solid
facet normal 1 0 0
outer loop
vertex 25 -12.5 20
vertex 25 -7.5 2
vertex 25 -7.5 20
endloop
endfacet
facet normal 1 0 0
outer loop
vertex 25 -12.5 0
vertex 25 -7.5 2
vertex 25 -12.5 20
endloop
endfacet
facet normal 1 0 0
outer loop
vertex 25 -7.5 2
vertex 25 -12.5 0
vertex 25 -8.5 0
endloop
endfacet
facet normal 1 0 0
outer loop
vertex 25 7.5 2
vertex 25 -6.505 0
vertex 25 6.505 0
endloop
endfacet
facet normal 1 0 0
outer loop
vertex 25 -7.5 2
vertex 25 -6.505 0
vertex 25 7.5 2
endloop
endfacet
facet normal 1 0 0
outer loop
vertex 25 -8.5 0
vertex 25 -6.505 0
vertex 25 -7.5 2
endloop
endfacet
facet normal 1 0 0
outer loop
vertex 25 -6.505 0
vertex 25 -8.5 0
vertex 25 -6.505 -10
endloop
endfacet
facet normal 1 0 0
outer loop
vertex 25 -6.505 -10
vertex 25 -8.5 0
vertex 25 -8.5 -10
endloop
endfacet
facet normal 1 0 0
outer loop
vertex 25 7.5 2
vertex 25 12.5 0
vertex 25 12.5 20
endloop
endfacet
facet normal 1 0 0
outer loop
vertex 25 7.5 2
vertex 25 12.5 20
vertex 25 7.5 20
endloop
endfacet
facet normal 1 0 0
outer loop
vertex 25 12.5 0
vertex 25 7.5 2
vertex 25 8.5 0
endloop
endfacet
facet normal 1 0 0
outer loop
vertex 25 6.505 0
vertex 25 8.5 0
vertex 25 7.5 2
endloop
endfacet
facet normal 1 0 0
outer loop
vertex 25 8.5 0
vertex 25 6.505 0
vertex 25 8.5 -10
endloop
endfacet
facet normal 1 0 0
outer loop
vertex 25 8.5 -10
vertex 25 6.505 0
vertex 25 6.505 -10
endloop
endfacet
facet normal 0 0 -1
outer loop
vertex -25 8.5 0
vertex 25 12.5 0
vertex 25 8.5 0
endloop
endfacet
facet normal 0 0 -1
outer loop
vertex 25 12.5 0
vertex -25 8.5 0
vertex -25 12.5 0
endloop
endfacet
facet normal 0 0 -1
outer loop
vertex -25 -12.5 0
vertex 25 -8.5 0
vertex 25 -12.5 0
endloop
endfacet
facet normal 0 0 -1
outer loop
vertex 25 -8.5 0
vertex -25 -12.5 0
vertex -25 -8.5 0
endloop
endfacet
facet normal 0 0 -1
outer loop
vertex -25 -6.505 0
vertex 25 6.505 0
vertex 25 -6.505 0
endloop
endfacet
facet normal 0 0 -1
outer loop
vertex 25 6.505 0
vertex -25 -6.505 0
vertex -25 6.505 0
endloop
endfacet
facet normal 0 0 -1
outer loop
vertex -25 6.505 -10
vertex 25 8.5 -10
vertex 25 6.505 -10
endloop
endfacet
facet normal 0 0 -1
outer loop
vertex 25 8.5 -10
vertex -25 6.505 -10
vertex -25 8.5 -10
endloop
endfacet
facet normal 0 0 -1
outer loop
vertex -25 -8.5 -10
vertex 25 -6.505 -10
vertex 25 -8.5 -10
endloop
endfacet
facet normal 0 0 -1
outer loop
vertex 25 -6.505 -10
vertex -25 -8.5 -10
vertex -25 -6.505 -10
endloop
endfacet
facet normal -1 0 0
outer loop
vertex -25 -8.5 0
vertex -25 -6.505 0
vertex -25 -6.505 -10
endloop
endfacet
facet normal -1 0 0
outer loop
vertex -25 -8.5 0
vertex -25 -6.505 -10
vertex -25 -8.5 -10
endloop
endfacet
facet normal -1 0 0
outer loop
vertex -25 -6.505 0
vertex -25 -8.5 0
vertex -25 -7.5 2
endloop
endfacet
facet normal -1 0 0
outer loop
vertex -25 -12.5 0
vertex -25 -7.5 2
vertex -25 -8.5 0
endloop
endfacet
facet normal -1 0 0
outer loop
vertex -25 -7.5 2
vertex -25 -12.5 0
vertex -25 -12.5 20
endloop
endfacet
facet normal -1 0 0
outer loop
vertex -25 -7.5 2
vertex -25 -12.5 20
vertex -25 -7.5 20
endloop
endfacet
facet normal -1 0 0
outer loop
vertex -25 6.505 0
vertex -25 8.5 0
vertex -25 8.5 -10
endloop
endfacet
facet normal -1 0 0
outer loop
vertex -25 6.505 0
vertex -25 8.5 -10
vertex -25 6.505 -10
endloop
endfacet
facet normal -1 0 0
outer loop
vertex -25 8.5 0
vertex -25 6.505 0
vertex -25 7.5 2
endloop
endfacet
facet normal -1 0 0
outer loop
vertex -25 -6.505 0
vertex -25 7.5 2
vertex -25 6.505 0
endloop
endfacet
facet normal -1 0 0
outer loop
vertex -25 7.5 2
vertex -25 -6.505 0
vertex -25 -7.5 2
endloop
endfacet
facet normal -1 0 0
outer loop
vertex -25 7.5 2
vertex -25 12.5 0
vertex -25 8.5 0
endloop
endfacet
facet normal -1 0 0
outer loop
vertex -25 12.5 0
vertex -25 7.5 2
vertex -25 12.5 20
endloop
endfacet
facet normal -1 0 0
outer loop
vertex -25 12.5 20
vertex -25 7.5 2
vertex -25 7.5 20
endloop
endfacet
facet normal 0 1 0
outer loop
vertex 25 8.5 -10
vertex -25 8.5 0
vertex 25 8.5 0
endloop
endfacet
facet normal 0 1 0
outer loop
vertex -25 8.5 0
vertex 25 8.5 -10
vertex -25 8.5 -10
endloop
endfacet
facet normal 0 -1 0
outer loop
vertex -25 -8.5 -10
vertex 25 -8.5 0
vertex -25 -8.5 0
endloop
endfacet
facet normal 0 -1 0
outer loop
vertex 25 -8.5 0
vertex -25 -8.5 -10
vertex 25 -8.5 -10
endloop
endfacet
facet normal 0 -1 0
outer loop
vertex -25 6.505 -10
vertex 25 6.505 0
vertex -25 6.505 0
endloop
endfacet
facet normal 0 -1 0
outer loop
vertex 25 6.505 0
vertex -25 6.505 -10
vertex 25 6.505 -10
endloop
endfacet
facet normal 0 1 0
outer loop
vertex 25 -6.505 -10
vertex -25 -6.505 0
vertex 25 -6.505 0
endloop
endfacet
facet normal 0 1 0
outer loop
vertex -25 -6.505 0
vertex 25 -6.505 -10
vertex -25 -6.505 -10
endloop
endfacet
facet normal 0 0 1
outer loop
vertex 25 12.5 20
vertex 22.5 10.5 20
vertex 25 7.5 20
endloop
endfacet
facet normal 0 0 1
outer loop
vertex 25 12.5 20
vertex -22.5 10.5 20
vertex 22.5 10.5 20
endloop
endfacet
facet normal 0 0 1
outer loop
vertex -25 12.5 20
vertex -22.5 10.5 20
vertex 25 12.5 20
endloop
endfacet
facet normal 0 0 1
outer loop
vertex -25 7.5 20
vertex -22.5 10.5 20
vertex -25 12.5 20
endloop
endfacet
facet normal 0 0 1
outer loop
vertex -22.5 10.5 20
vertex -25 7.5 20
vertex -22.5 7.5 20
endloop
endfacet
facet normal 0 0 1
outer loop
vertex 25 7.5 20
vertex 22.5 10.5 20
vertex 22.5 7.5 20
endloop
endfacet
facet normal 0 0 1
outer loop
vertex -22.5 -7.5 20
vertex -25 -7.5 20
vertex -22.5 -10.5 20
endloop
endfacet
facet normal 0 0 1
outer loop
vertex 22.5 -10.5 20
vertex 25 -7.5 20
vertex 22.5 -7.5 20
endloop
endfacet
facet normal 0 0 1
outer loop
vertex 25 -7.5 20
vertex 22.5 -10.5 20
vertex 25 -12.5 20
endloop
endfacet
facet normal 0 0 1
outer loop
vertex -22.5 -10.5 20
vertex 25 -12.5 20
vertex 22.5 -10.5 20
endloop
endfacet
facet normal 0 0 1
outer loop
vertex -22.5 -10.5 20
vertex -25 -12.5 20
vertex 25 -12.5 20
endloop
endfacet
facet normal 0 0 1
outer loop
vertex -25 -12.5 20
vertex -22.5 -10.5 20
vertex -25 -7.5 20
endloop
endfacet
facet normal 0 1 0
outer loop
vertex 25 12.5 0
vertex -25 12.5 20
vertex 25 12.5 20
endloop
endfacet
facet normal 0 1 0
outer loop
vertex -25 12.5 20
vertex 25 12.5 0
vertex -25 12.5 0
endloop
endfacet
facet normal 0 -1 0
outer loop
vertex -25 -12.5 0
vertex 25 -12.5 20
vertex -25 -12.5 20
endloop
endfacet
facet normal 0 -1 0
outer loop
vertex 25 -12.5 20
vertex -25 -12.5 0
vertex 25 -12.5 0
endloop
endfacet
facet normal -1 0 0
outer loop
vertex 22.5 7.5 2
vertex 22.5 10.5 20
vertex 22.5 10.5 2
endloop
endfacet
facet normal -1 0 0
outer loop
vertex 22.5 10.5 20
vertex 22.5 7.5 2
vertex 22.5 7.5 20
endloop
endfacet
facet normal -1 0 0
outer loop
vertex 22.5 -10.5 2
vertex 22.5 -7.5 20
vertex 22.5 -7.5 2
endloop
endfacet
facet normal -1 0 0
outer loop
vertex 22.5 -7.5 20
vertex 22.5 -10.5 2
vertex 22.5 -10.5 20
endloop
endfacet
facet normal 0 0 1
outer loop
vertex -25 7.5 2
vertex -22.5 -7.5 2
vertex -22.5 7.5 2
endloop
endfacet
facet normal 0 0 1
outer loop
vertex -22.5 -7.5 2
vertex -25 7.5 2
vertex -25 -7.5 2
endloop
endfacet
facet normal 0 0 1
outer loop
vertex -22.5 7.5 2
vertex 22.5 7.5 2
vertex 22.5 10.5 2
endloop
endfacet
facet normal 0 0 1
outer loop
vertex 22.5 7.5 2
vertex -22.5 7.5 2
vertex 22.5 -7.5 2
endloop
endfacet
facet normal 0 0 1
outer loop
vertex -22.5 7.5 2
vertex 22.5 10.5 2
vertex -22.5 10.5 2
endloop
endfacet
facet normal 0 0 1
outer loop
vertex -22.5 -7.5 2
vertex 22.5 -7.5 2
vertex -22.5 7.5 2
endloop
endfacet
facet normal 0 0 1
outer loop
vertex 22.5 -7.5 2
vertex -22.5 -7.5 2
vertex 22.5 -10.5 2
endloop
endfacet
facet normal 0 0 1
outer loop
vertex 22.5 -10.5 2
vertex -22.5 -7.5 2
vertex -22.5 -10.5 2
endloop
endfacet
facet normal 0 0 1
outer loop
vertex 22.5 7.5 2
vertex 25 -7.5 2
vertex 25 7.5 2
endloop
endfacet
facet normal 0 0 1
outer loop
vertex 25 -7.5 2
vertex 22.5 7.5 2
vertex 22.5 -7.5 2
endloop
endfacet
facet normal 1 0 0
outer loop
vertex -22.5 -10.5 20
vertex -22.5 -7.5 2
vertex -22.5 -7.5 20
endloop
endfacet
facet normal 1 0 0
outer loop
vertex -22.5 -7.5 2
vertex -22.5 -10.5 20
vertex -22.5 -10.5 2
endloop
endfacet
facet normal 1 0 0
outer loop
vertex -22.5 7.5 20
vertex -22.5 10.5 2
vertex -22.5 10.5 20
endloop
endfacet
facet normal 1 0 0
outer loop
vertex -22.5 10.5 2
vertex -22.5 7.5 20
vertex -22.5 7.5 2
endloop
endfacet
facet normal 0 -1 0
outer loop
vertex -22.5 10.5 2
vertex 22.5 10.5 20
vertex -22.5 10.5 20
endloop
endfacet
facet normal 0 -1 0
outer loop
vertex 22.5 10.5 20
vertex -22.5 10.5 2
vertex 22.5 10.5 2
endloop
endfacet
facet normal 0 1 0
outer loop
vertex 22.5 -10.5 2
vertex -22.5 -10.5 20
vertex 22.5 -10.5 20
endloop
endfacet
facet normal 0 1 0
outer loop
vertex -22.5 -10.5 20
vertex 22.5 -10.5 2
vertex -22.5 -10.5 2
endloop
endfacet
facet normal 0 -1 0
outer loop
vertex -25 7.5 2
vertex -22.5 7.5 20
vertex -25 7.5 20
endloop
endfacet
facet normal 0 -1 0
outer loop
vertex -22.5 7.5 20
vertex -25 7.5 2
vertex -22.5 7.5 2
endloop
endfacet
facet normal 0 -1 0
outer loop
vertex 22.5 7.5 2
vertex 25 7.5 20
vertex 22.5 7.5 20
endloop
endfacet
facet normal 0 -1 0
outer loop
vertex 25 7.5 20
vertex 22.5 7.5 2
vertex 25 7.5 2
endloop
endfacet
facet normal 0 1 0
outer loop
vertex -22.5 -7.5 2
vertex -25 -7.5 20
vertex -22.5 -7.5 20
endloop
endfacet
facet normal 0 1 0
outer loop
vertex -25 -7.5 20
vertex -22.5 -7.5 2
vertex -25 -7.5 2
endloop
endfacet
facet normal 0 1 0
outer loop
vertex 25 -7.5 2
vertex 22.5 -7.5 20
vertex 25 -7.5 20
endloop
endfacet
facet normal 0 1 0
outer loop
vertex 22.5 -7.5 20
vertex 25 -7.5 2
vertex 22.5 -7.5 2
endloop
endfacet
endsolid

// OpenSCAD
holerad=2.5;
module pi(){
difference(){
translate([0,0,-5])cube([90,13+4,10],center=true);
translate([0,0,-5])cube([90.01,13.01,10],center=true);
}
difference(){
    translate([0,0,1])cube([90,60,2],center=true);
    translate([20-60,-24.5, 1])cylinder(4, r=holerad,center=true,$fn=50);
    translate([20-60, 24.5, 1])cylinder(4, r=holerad,center=true,$fn=50);
    translate([20-2,-24.5,  1])cylinder(4, r=holerad,center=true,$fn=50);
    translate([20-2, 24.5,  1])cylinder(4, r=holerad,center=true,$fn=50);
}
}


module speaker(){
    
    difference(){
    translate([0,0,-5])cube([50,13+4,10],center=true);
    translate([0,0,-5])cube([50.01,13.01,10],center=true);
    }

    difference(){
        translate([0,0,10])cube([50,25,20],center=true);
        translate([0,0,10+2])cube([45,21,20],center=true);
        translate([0,0,10+2])cube([55,15,20],center=true);
    }
}



module landing(){
    difference(){
        translate([0,0,5])cube([100,70,10],center=true);
        translate([0,0,6])cube([96,66,8],center=true);
    }
    difference(){
    translate([0,0,-5])cube([100,13+4,10],center=true);
    translate([0,0,-5])cube([100.01,13.01,10],center=true);
    }
}




//pi();

speaker();

//landing();
